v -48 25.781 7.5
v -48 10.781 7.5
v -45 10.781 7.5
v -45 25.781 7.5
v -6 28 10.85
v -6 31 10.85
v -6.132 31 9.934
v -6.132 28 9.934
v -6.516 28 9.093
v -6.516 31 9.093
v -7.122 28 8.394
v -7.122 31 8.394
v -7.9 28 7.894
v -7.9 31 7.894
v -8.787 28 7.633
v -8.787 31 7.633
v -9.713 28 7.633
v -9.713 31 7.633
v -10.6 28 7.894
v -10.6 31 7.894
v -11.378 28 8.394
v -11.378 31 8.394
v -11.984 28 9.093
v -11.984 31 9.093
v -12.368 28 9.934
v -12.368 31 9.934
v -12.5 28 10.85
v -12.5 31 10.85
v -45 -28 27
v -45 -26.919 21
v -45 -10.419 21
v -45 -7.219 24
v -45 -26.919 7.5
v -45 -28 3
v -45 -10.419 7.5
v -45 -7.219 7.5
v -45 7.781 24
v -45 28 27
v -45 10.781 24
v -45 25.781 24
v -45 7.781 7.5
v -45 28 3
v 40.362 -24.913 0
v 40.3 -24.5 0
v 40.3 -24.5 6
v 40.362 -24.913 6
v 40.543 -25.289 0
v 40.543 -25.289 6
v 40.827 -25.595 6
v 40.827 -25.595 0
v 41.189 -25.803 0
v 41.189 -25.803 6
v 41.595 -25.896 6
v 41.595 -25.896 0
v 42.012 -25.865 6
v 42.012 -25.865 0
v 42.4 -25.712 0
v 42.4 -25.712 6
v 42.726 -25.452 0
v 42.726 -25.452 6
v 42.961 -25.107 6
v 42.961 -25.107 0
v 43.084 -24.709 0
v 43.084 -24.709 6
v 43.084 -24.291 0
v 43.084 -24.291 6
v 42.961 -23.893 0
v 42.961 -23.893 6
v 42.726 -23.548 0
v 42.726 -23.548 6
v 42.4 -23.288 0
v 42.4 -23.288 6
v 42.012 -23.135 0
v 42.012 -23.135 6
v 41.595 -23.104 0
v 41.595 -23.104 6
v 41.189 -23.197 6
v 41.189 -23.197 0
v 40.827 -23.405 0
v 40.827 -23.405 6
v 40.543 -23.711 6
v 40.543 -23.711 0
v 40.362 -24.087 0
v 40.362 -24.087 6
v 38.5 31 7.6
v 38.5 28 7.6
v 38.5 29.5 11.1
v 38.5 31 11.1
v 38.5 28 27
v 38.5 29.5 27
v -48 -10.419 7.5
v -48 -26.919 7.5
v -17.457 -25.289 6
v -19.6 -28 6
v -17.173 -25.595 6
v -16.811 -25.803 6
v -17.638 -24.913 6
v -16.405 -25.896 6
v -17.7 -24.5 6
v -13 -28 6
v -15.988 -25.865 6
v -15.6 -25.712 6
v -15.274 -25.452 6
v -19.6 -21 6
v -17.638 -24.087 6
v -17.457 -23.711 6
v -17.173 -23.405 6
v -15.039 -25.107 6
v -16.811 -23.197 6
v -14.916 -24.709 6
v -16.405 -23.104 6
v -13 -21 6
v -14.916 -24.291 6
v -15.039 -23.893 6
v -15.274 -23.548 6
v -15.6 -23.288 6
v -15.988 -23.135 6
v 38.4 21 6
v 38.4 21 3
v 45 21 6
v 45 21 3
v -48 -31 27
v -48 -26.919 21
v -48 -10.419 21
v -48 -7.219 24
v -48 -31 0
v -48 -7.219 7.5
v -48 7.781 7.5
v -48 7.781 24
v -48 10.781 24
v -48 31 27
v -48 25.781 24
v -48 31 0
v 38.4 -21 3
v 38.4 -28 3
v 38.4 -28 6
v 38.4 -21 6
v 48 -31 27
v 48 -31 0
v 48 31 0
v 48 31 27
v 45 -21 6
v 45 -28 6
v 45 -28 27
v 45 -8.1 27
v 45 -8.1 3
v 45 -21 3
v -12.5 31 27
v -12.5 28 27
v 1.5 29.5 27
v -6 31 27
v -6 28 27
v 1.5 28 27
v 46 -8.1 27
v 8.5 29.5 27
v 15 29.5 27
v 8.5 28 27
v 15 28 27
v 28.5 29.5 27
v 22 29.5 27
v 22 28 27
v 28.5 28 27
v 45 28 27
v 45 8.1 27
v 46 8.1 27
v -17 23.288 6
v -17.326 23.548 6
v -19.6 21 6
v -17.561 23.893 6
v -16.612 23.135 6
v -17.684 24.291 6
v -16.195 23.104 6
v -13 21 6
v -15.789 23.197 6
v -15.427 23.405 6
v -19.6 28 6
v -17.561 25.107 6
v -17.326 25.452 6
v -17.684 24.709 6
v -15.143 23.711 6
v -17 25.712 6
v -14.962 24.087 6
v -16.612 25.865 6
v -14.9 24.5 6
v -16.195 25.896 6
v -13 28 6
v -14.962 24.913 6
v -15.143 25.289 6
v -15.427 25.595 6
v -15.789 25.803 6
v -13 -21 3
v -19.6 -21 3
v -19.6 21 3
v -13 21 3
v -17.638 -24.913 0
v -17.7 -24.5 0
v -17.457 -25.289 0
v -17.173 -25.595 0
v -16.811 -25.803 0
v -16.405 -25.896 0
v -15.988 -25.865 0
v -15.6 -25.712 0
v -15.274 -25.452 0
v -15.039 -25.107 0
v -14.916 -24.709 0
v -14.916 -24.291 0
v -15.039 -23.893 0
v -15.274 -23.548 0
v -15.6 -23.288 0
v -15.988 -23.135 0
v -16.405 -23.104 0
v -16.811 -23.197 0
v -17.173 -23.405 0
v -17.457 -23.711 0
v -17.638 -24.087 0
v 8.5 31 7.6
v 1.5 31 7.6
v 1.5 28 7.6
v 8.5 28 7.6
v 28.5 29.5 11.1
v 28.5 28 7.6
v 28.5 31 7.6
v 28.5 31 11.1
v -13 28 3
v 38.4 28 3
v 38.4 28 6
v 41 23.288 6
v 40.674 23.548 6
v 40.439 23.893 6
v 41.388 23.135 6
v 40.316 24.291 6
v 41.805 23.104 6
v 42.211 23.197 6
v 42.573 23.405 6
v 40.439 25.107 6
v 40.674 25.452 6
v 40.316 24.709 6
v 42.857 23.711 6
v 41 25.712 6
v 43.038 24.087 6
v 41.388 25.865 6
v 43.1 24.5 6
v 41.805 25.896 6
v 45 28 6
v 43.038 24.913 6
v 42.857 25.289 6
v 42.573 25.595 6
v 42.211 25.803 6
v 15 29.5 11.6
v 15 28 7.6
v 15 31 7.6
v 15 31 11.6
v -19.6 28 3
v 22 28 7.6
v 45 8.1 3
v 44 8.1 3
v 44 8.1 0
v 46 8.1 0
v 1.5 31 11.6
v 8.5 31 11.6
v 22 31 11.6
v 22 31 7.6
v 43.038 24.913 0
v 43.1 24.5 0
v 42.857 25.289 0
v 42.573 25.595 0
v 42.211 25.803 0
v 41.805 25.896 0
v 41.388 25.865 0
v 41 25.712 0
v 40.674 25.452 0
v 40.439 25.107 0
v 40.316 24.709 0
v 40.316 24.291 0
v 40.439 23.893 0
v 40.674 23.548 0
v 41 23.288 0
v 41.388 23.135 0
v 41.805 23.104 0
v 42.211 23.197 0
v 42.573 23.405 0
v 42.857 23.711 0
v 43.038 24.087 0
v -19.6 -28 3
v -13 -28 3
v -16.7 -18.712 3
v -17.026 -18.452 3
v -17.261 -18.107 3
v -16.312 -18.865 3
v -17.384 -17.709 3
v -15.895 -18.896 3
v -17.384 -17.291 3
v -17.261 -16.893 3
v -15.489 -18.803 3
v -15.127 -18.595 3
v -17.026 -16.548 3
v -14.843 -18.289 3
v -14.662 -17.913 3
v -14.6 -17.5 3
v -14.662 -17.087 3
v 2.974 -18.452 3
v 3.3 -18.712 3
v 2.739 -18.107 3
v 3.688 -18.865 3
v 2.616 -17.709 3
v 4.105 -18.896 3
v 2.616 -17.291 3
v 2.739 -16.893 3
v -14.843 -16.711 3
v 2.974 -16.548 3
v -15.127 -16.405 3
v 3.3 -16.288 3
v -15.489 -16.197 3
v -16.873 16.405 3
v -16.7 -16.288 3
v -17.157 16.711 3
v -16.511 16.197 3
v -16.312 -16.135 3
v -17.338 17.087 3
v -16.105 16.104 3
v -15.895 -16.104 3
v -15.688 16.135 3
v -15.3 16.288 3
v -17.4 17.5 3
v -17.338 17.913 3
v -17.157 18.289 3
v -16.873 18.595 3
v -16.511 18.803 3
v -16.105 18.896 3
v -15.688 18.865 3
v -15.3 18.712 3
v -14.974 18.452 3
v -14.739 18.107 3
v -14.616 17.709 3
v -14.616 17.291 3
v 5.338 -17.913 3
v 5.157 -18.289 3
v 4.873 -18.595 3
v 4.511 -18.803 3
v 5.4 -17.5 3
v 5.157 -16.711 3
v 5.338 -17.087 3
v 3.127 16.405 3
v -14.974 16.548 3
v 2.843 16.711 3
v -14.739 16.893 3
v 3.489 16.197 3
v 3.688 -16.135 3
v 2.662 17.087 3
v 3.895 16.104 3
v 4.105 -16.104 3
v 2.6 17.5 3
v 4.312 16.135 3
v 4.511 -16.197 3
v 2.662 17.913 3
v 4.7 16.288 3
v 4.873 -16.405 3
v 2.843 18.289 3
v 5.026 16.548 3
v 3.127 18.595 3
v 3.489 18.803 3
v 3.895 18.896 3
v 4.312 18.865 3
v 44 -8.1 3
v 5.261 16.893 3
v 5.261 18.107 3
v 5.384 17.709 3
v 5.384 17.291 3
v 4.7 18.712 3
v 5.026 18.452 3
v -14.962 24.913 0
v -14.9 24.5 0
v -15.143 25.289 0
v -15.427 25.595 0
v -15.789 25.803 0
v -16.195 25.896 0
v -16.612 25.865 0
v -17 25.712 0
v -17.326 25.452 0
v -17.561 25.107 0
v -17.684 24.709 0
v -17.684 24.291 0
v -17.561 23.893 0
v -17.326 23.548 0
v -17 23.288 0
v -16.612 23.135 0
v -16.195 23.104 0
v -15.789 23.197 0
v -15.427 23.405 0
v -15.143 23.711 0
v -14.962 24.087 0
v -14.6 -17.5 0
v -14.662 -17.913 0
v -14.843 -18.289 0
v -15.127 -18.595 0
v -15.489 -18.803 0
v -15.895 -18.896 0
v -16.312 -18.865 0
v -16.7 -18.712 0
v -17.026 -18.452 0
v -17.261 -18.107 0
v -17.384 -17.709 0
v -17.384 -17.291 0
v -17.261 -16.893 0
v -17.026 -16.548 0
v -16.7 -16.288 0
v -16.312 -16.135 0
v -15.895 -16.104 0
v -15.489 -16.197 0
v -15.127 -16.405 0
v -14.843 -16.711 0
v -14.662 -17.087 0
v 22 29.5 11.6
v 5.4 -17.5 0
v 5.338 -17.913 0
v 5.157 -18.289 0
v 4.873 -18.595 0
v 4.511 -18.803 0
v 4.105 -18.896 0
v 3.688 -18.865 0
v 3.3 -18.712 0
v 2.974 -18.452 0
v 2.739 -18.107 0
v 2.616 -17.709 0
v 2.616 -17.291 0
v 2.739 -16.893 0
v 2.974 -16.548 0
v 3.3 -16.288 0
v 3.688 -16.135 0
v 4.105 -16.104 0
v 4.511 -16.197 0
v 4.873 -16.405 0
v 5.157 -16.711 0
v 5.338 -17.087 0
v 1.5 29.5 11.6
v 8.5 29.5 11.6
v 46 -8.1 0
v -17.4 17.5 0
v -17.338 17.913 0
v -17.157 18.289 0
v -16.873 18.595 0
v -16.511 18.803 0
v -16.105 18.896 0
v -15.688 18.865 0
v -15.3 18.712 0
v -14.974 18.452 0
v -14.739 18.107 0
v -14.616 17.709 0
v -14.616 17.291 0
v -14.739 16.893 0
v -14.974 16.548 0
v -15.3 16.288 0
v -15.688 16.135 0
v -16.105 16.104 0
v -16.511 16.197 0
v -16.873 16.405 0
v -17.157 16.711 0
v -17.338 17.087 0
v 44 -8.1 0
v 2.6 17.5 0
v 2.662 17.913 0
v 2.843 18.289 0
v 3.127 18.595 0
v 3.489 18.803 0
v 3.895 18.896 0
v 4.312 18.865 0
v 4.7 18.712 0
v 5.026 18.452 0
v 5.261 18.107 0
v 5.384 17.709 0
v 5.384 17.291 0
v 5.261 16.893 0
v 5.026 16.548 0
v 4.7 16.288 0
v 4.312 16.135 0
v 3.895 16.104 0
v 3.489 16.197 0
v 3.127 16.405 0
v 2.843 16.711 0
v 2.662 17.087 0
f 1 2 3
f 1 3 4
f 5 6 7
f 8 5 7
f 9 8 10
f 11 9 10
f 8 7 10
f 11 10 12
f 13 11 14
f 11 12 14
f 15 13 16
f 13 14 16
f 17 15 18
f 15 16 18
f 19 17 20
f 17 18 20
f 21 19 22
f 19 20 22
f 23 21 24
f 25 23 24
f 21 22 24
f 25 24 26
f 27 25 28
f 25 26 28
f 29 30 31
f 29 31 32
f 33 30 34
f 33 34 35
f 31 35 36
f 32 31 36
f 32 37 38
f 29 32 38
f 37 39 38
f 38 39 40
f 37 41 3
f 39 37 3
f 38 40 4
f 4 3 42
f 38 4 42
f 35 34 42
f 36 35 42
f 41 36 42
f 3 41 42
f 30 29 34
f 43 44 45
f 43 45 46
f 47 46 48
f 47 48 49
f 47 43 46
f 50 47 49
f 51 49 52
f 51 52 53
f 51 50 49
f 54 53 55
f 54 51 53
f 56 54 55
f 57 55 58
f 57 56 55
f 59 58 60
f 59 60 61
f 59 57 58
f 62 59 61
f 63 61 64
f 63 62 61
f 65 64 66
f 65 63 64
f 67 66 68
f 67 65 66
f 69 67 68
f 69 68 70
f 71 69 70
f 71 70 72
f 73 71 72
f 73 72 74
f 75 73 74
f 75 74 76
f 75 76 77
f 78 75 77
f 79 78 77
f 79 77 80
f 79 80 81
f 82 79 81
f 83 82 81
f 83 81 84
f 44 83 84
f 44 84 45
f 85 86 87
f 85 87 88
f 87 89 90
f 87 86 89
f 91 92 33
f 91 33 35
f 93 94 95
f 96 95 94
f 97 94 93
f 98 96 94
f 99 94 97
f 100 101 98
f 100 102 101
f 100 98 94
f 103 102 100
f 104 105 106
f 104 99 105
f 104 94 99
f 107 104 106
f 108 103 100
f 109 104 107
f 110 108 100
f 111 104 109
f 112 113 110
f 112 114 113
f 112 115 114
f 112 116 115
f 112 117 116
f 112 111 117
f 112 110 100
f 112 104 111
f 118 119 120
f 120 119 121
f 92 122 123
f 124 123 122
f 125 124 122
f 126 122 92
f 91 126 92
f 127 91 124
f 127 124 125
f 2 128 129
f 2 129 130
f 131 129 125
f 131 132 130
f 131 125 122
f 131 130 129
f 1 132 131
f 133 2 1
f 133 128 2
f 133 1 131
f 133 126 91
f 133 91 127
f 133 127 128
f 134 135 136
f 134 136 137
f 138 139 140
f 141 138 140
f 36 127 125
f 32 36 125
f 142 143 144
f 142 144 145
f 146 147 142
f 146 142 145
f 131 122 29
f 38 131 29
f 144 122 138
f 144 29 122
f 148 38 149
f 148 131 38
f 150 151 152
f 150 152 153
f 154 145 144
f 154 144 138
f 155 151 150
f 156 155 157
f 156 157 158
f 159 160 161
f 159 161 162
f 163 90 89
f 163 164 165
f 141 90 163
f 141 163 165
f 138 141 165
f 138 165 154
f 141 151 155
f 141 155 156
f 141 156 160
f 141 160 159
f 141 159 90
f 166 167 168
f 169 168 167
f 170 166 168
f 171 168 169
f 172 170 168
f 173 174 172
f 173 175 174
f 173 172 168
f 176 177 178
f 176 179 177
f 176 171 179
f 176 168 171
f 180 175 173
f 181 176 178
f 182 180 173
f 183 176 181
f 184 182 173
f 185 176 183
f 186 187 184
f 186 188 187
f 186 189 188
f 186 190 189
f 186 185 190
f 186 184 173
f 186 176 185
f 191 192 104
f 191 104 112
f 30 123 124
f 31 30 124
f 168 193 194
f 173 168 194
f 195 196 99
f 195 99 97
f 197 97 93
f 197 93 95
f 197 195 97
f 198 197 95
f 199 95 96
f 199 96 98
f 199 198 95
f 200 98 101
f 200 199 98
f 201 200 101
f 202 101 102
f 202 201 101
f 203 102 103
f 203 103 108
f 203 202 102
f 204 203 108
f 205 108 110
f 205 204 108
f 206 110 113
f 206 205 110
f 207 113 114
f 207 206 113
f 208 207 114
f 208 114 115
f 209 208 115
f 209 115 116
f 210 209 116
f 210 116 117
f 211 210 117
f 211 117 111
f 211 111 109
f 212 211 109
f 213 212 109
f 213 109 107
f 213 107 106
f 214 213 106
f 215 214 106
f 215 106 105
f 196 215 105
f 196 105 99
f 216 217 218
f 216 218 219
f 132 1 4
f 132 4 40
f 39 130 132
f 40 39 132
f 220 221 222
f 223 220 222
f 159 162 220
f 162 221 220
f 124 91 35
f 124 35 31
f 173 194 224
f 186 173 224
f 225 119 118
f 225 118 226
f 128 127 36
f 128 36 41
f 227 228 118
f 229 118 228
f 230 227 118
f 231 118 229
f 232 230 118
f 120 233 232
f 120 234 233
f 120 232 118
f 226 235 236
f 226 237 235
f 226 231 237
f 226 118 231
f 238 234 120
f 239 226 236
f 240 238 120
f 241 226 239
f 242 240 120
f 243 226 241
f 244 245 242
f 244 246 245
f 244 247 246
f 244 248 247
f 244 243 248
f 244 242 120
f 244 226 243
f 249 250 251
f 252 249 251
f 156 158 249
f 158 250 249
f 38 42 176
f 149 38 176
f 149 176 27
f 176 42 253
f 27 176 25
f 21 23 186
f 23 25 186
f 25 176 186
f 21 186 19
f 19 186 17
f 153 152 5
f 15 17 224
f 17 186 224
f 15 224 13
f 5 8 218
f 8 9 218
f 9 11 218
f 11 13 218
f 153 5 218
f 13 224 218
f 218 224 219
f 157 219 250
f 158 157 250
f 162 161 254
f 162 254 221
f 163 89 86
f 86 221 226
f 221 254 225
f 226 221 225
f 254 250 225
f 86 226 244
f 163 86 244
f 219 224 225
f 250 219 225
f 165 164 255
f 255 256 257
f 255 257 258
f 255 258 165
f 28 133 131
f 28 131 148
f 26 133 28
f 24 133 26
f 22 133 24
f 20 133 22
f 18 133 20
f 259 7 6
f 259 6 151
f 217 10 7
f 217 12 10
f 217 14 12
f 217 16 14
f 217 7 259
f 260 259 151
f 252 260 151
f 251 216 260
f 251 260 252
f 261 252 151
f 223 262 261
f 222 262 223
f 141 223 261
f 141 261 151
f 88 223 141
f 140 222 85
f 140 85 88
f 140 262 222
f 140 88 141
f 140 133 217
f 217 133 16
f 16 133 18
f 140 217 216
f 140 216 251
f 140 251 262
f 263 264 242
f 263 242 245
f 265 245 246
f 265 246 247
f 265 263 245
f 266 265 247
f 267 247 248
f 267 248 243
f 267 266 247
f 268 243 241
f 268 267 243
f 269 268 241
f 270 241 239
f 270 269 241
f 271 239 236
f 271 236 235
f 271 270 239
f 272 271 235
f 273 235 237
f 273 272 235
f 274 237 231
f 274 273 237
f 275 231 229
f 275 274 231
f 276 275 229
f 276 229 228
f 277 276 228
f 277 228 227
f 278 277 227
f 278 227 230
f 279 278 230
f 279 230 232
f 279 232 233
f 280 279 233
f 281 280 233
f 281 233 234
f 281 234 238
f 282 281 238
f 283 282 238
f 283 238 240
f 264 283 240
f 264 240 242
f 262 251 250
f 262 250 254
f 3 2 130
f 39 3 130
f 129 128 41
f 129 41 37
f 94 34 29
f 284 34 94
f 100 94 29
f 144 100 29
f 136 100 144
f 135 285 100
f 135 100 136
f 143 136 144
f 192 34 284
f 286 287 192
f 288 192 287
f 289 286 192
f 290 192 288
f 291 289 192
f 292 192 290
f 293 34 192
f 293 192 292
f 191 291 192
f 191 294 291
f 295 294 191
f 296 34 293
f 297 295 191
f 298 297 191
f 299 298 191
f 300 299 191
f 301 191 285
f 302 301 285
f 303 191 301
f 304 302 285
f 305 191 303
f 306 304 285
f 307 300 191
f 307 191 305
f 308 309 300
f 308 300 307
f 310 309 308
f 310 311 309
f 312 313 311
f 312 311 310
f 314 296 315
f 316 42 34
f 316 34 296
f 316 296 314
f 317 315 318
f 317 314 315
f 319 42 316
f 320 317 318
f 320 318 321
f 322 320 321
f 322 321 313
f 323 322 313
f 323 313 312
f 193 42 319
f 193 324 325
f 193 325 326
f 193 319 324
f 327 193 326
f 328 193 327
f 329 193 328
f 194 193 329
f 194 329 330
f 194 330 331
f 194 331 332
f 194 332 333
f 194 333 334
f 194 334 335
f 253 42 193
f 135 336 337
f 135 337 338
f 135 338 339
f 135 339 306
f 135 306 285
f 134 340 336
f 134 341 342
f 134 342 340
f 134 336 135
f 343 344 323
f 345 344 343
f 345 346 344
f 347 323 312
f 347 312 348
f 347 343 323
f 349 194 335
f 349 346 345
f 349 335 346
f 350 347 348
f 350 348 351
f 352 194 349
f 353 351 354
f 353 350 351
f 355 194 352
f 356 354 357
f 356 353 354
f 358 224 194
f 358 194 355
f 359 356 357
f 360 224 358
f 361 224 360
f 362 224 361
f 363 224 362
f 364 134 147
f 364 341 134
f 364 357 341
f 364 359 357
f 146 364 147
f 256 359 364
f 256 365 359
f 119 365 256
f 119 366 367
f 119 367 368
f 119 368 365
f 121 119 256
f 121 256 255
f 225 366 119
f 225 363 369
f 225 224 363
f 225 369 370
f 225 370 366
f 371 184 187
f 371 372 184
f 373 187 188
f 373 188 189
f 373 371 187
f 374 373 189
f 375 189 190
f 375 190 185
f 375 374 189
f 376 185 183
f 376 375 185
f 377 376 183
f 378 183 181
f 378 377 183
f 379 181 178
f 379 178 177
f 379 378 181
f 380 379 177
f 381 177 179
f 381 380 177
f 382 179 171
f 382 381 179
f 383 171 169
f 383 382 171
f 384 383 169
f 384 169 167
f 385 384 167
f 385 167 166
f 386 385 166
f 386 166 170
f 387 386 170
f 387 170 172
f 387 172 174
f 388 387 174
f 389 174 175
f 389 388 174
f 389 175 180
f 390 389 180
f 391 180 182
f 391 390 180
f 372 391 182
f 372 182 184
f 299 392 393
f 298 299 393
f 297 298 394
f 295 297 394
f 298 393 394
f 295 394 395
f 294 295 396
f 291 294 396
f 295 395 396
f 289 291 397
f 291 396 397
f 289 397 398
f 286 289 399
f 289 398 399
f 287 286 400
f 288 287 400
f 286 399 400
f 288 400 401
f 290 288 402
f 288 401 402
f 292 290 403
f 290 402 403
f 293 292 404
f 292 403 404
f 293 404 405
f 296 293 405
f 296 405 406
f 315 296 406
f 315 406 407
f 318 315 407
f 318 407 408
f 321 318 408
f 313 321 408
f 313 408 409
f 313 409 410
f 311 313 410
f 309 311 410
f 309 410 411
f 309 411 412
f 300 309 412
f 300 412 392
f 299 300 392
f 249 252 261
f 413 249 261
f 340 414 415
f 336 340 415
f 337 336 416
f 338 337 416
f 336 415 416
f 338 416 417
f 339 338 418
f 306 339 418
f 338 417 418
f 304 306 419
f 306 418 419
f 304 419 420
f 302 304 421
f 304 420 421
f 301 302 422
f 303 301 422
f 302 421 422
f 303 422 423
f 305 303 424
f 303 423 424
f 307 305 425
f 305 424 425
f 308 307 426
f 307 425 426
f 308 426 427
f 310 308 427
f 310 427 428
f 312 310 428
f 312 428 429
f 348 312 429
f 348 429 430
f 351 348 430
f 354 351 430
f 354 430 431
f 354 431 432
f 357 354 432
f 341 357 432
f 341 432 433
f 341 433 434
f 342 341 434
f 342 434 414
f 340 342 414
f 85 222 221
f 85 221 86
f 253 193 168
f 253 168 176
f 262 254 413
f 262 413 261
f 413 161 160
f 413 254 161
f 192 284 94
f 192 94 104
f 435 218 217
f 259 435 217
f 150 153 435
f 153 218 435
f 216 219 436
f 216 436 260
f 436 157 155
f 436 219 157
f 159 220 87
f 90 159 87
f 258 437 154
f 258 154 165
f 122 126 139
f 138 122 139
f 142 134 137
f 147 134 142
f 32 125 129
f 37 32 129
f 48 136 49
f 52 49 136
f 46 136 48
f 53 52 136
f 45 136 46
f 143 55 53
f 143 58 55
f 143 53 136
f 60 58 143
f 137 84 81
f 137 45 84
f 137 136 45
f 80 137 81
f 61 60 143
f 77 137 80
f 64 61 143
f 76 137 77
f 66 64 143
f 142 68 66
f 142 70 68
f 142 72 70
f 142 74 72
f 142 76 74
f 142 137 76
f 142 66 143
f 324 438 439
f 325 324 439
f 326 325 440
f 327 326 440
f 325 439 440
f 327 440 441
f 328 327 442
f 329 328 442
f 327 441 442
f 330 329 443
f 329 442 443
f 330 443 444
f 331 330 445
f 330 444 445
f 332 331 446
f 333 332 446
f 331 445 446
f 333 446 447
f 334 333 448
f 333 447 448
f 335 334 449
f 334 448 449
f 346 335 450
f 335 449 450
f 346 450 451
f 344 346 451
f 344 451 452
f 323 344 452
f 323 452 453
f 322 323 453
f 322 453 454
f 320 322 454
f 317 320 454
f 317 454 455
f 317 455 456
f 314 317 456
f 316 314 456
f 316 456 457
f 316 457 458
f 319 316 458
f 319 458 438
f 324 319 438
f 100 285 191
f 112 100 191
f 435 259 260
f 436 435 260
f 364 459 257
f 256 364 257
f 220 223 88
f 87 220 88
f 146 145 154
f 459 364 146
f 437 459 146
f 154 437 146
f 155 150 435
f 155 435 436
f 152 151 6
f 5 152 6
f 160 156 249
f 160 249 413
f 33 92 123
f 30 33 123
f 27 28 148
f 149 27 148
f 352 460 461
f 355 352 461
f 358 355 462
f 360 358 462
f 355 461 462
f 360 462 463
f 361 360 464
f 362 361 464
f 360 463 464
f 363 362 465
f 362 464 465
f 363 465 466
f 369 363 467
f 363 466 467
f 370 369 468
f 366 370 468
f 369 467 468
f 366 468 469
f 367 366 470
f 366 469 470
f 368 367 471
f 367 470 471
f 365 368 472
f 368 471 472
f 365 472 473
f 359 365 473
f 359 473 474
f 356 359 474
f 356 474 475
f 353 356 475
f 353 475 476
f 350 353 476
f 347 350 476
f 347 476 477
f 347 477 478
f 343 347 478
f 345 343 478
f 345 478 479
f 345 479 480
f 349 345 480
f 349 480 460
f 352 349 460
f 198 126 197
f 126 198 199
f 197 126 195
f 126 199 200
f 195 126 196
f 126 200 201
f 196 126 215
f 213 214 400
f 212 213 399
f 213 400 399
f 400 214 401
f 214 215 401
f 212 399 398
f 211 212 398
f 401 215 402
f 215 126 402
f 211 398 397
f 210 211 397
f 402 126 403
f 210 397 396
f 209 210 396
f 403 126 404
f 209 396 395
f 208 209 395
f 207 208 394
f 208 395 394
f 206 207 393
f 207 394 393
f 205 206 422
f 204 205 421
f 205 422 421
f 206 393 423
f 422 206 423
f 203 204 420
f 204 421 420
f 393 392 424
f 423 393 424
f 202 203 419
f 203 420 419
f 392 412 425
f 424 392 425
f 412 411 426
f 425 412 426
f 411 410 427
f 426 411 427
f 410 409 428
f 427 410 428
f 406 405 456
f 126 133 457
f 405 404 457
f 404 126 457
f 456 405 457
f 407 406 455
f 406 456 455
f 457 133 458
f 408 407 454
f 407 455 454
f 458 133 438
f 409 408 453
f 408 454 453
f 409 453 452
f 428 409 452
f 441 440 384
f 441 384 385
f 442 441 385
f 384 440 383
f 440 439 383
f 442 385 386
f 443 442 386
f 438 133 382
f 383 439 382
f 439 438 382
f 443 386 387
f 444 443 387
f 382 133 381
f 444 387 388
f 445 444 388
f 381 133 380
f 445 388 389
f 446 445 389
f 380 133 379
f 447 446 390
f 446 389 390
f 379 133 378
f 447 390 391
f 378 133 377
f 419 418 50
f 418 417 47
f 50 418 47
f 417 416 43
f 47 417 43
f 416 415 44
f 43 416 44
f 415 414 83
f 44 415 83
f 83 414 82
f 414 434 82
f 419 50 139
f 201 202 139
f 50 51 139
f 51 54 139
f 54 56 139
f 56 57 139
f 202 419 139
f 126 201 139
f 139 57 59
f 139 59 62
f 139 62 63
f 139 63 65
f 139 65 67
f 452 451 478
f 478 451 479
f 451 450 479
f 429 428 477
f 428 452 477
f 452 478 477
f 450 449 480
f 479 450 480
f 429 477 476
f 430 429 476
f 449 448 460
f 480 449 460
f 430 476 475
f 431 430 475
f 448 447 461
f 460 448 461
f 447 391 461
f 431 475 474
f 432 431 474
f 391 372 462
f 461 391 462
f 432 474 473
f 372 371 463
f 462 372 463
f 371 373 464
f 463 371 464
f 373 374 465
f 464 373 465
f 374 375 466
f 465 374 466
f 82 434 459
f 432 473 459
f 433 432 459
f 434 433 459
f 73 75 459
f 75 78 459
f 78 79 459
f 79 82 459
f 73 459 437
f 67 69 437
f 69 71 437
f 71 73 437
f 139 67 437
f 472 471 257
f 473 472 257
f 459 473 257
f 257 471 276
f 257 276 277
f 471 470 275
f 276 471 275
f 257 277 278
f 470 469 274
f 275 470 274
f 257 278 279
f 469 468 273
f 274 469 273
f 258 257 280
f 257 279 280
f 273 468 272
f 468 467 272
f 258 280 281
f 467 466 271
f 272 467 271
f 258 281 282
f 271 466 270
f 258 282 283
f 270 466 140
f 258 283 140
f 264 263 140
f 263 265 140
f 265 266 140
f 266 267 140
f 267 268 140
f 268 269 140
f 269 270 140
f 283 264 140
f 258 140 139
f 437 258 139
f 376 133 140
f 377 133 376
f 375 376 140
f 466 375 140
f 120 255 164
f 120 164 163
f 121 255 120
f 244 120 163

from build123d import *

# Parameters (mm, degrees)
SKETCH_1_W               = 90
SKETCH_1_H               = 56
SKETCH_1_R               = 1.4
EXTRUDE_1_DEPTH          = 3
SKETCH_2_W               = 6.6
SKETCH_2_H               = 7
SKETCH_2_R               = 1.4
EXTRUDE_2_DEPTH          = 3
SKETCH_3_W               = 96
SKETCH_3_H               = 62
SKETCH_3_W_2             = 90
SKETCH_3_H_2             = 56
EXTRUDE_3_DEPTH          = 27
SKETCH_4_W               = 16.5
SKETCH_4_H               = 15
SKETCH_4_W_2             = 13.5
SKETCH_4_H_2             = 16.5
CUT_EXTRUDE_1_DEPTH      = 3
CUT_EXTRUDE_2_REACH      = 84.928
SKETCH_5_W               = 10
SKETCH_5_H               = 3.5
SKETCH_5_W_2             = 7
SKETCH_5_H_2             = 4
CUT_EXTRUDE_3_REACH      = 65.198
SKETCH_6_W               = 7
SKETCH_6_H               = 1.5
SKETCH_6_W_2             = 10
CUT_EXTRUDE_6_DEPTH      = 64.198101237
CUT_EXTRUDE_6_DEPTH_BACK = 5
SKETCH_7_W               = 2
SKETCH_7_H               = 16.2
SKETCH_8_R               = 1.4
CUT_EXTRUDE_7_DEPTH      = 5


with BuildPart() as part:
    # 스케치1 → 보스-돌출1 (new body)
    with BuildSketch(Plane.XY):
        Rectangle(SKETCH_1_W, SKETCH_1_H)
        with Locations((-16.3, 24.5)):
            Circle(SKETCH_1_R, mode=Mode.SUBTRACT)
        with Locations((41.7, 24.5)):
            Circle(SKETCH_1_R, mode=Mode.SUBTRACT)
        with Locations(Location((41.7, -24.5, 0), (0, 0, 180))):
            Circle(SKETCH_1_R, mode=Mode.SUBTRACT)
        with Locations(Location((-16.3, -24.5, 0), (0, 0, 180))):
            Circle(SKETCH_1_R, mode=Mode.SUBTRACT)
    extrude(amount=EXTRUDE_1_DEPTH)

    # 스케치2 → 보스-돌출2 (add)
    # profile 1 of 4: a face of its own
    with BuildSketch(Plane.XY.offset(3)):
        with Locations((-16.3, 24.5)):
            Rectangle(SKETCH_2_W, SKETCH_2_H)
        with Locations((-16.3, 24.5)):
            Circle(SKETCH_2_R, mode=Mode.SUBTRACT)
    # profile 2 of 4: a face of its own
    with BuildSketch(Plane.XY.offset(3)):
        with Locations((41.7, 24.5)):
            Rectangle(SKETCH_2_W, SKETCH_2_H)
        with Locations((41.7, 24.5)):
            Circle(SKETCH_2_R, mode=Mode.SUBTRACT)
    # profile 3 of 4: a face of its own
    with BuildSketch(Plane.XY.offset(3)):
        with Locations((41.7, -24.5)):
            Rectangle(SKETCH_2_W, SKETCH_2_H)
        with Locations(Location((41.7, -24.5, 0), (0, 0, 180))):
            Circle(SKETCH_2_R, mode=Mode.SUBTRACT)
    # profile 4 of 4: a face of its own
    with BuildSketch(Plane.XY.offset(3)):
        with Locations((-16.3, -24.5)):
            Rectangle(SKETCH_2_W, SKETCH_2_H)
        with Locations(Location((-16.3, -24.5, 0), (0, 0, 180))):
            Circle(SKETCH_2_R, mode=Mode.SUBTRACT)
    extrude(amount=EXTRUDE_2_DEPTH)

    # 스케치3 → 보스-돌출3 (add)
    with BuildSketch(Plane.XY):
        Rectangle(SKETCH_3_W, SKETCH_3_H)
        Rectangle(SKETCH_3_W_2, SKETCH_3_H_2, mode=Mode.SUBTRACT)
    extrude(amount=EXTRUDE_3_DEPTH)

    # 스케치4 → 컷-돌출1 (cut)
    with BuildSketch(Plane.ZY.offset(48)):
        with Locations((15.75, 18.280682484)):
            Rectangle(SKETCH_4_W, SKETCH_4_H)
        with Locations((15.75, 0.280682484)):
            Rectangle(SKETCH_4_W, SKETCH_4_H)
        with Locations((14.25, -18.669317516)):
            Rectangle(SKETCH_4_W_2, SKETCH_4_H_2)
    extrude(amount=-CUT_EXTRUDE_1_DEPTH, mode=Mode.SUBTRACT)

    # 스케치5 → 컷-돌출2 (cut, up to next)
    with BuildSketch(Plane(origin=(0, 31, 0), x_dir=(1, 0, 0), z_dir=(0, 1, 0)), mode=Mode.PRIVATE) as cut_extrude_2_sk1:
        with Locations((33.5, -9.35)):
            Rectangle(SKETCH_5_W, SKETCH_5_H)
    cut_extrude_2_tool1 = extrude(cut_extrude_2_sk1.sketch, amount=-CUT_EXTRUDE_2_REACH, mode=Mode.PRIVATE) & part.part
    # 스케치5 → 컷-돌출2 (cut, up to next)
    with BuildSketch(Plane(origin=(0, 31, 0), x_dir=(1, 0, 0), z_dir=(0, 1, 0)), mode=Mode.PRIVATE) as cut_extrude_2_sk2:
        with Locations((18.5, -9.6)):
            Rectangle(SKETCH_5_W_2, SKETCH_5_H_2)
    cut_extrude_2_tool2 = extrude(cut_extrude_2_sk2.sketch, amount=-CUT_EXTRUDE_2_REACH, mode=Mode.PRIVATE) & part.part
    # 스케치5 → 컷-돌출2 (cut, up to next)
    with BuildSketch(Plane(origin=(0, 31, 0), x_dir=(1, 0, 0), z_dir=(0, 1, 0)), mode=Mode.PRIVATE) as cut_extrude_2_sk3:
        with Locations((5, -9.6)):
            Rectangle(SKETCH_5_W_2, SKETCH_5_H_2)
    cut_extrude_2_tool3 = extrude(cut_extrude_2_sk3.sketch, amount=-CUT_EXTRUDE_2_REACH, mode=Mode.PRIVATE) & part.part
    # 스케치5 → 컷-돌출2 (cut, up to next)
    with BuildSketch(Plane(origin=(0, 31, 0), x_dir=(1, 0, 0), z_dir=(0, 1, 0)), mode=Mode.PRIVATE) as cut_extrude_2_sk4:
        with BuildLine():
            Line((-12.5, -10.85), (-12.5, -27))
            Line((-12.5, -27), (-6, -27))
            Line((-6, -27), (-6, -10.85))
            ThreePointArc((-6, -10.85), (-9.25, -7.6), (-12.5, -10.85))
        make_face()
    cut_extrude_2_tool4 = extrude(cut_extrude_2_sk4.sketch, amount=-CUT_EXTRUDE_2_REACH, mode=Mode.PRIVATE) & part.part
    add(cut_extrude_2_tool1.solids().sort_by_distance((33.5, 31, 9.35))[0], mode=Mode.SUBTRACT)
    add(cut_extrude_2_tool2.solids().sort_by_distance((18.5, 31, 9.6))[0], mode=Mode.SUBTRACT)
    add(cut_extrude_2_tool3.solids().sort_by_distance((5, 31, 9.6))[0], mode=Mode.SUBTRACT)
    add(cut_extrude_2_tool4.solids().sort_by_distance((-9.25, 31, 17.634661))[0], mode=Mode.SUBTRACT)

    # 스케치6 → 컷-돌출3 (cut, up to next)
    with BuildSketch(Plane.XY.offset(27), mode=Mode.PRIVATE) as cut_extrude_3_sk1:
        with Locations((5, 28.75)):
            Rectangle(SKETCH_6_W, SKETCH_6_H)
    cut_extrude_3_tool1 = extrude(cut_extrude_3_sk1.sketch, amount=-CUT_EXTRUDE_3_REACH, mode=Mode.PRIVATE) & part.part
    # 스케치6 → 컷-돌출3 (cut, up to next)
    with BuildSketch(Plane.XY.offset(27), mode=Mode.PRIVATE) as cut_extrude_3_sk2:
        with Locations((18.5, 28.75)):
            Rectangle(SKETCH_6_W, SKETCH_6_H)
    cut_extrude_3_tool2 = extrude(cut_extrude_3_sk2.sketch, amount=-CUT_EXTRUDE_3_REACH, mode=Mode.PRIVATE) & part.part
    # 스케치6 → 컷-돌출3 (cut, up to next)
    with BuildSketch(Plane.XY.offset(27), mode=Mode.PRIVATE) as cut_extrude_3_sk3:
        with Locations((33.5, 28.75)):
            Rectangle(SKETCH_6_W_2, SKETCH_6_H)
    cut_extrude_3_tool3 = extrude(cut_extrude_3_sk3.sketch, amount=-CUT_EXTRUDE_3_REACH, mode=Mode.PRIVATE) & part.part
    add(cut_extrude_3_tool1.solids().sort_by_distance((5, 28.75, 27))[0], mode=Mode.SUBTRACT)
    add(cut_extrude_3_tool2.solids().sort_by_distance((18.5, 28.75, 27))[0], mode=Mode.SUBTRACT)
    add(cut_extrude_3_tool3.solids().sort_by_distance((33.5, 28.75, 27))[0], mode=Mode.SUBTRACT)

    # 스케치7 → 컷-돌출6 (cut, two sides: drawn at the far end of the back side and taken through both)
    with BuildSketch(Plane.XY.offset(-CUT_EXTRUDE_6_DEPTH_BACK)):
        with Locations((45, 0)):
            Rectangle(SKETCH_7_W, SKETCH_7_H)
    extrude(amount=CUT_EXTRUDE_6_DEPTH + CUT_EXTRUDE_6_DEPTH_BACK, mode=Mode.SUBTRACT)

    # 스케치8 → 컷-돌출7 (cut)
    with BuildSketch(Plane(origin=(0, 0, 0), x_dir=(-1, 0, 0), z_dir=(0, 0, -1))):
        with Locations((-4, 17.5)):
            Circle(SKETCH_8_R)
        with Locations((16, 17.5)):
            Circle(SKETCH_8_R)
        with Locations(Location((-4, -17.5, 0), (0, 0, 180))):
            Circle(SKETCH_8_R)
        with Locations(Location((16, -17.5, 0), (0, 0, 180))):
            Circle(SKETCH_8_R)
    extrude(amount=-CUT_EXTRUDE_7_DEPTH, mode=Mode.SUBTRACT)


solid = part.part
